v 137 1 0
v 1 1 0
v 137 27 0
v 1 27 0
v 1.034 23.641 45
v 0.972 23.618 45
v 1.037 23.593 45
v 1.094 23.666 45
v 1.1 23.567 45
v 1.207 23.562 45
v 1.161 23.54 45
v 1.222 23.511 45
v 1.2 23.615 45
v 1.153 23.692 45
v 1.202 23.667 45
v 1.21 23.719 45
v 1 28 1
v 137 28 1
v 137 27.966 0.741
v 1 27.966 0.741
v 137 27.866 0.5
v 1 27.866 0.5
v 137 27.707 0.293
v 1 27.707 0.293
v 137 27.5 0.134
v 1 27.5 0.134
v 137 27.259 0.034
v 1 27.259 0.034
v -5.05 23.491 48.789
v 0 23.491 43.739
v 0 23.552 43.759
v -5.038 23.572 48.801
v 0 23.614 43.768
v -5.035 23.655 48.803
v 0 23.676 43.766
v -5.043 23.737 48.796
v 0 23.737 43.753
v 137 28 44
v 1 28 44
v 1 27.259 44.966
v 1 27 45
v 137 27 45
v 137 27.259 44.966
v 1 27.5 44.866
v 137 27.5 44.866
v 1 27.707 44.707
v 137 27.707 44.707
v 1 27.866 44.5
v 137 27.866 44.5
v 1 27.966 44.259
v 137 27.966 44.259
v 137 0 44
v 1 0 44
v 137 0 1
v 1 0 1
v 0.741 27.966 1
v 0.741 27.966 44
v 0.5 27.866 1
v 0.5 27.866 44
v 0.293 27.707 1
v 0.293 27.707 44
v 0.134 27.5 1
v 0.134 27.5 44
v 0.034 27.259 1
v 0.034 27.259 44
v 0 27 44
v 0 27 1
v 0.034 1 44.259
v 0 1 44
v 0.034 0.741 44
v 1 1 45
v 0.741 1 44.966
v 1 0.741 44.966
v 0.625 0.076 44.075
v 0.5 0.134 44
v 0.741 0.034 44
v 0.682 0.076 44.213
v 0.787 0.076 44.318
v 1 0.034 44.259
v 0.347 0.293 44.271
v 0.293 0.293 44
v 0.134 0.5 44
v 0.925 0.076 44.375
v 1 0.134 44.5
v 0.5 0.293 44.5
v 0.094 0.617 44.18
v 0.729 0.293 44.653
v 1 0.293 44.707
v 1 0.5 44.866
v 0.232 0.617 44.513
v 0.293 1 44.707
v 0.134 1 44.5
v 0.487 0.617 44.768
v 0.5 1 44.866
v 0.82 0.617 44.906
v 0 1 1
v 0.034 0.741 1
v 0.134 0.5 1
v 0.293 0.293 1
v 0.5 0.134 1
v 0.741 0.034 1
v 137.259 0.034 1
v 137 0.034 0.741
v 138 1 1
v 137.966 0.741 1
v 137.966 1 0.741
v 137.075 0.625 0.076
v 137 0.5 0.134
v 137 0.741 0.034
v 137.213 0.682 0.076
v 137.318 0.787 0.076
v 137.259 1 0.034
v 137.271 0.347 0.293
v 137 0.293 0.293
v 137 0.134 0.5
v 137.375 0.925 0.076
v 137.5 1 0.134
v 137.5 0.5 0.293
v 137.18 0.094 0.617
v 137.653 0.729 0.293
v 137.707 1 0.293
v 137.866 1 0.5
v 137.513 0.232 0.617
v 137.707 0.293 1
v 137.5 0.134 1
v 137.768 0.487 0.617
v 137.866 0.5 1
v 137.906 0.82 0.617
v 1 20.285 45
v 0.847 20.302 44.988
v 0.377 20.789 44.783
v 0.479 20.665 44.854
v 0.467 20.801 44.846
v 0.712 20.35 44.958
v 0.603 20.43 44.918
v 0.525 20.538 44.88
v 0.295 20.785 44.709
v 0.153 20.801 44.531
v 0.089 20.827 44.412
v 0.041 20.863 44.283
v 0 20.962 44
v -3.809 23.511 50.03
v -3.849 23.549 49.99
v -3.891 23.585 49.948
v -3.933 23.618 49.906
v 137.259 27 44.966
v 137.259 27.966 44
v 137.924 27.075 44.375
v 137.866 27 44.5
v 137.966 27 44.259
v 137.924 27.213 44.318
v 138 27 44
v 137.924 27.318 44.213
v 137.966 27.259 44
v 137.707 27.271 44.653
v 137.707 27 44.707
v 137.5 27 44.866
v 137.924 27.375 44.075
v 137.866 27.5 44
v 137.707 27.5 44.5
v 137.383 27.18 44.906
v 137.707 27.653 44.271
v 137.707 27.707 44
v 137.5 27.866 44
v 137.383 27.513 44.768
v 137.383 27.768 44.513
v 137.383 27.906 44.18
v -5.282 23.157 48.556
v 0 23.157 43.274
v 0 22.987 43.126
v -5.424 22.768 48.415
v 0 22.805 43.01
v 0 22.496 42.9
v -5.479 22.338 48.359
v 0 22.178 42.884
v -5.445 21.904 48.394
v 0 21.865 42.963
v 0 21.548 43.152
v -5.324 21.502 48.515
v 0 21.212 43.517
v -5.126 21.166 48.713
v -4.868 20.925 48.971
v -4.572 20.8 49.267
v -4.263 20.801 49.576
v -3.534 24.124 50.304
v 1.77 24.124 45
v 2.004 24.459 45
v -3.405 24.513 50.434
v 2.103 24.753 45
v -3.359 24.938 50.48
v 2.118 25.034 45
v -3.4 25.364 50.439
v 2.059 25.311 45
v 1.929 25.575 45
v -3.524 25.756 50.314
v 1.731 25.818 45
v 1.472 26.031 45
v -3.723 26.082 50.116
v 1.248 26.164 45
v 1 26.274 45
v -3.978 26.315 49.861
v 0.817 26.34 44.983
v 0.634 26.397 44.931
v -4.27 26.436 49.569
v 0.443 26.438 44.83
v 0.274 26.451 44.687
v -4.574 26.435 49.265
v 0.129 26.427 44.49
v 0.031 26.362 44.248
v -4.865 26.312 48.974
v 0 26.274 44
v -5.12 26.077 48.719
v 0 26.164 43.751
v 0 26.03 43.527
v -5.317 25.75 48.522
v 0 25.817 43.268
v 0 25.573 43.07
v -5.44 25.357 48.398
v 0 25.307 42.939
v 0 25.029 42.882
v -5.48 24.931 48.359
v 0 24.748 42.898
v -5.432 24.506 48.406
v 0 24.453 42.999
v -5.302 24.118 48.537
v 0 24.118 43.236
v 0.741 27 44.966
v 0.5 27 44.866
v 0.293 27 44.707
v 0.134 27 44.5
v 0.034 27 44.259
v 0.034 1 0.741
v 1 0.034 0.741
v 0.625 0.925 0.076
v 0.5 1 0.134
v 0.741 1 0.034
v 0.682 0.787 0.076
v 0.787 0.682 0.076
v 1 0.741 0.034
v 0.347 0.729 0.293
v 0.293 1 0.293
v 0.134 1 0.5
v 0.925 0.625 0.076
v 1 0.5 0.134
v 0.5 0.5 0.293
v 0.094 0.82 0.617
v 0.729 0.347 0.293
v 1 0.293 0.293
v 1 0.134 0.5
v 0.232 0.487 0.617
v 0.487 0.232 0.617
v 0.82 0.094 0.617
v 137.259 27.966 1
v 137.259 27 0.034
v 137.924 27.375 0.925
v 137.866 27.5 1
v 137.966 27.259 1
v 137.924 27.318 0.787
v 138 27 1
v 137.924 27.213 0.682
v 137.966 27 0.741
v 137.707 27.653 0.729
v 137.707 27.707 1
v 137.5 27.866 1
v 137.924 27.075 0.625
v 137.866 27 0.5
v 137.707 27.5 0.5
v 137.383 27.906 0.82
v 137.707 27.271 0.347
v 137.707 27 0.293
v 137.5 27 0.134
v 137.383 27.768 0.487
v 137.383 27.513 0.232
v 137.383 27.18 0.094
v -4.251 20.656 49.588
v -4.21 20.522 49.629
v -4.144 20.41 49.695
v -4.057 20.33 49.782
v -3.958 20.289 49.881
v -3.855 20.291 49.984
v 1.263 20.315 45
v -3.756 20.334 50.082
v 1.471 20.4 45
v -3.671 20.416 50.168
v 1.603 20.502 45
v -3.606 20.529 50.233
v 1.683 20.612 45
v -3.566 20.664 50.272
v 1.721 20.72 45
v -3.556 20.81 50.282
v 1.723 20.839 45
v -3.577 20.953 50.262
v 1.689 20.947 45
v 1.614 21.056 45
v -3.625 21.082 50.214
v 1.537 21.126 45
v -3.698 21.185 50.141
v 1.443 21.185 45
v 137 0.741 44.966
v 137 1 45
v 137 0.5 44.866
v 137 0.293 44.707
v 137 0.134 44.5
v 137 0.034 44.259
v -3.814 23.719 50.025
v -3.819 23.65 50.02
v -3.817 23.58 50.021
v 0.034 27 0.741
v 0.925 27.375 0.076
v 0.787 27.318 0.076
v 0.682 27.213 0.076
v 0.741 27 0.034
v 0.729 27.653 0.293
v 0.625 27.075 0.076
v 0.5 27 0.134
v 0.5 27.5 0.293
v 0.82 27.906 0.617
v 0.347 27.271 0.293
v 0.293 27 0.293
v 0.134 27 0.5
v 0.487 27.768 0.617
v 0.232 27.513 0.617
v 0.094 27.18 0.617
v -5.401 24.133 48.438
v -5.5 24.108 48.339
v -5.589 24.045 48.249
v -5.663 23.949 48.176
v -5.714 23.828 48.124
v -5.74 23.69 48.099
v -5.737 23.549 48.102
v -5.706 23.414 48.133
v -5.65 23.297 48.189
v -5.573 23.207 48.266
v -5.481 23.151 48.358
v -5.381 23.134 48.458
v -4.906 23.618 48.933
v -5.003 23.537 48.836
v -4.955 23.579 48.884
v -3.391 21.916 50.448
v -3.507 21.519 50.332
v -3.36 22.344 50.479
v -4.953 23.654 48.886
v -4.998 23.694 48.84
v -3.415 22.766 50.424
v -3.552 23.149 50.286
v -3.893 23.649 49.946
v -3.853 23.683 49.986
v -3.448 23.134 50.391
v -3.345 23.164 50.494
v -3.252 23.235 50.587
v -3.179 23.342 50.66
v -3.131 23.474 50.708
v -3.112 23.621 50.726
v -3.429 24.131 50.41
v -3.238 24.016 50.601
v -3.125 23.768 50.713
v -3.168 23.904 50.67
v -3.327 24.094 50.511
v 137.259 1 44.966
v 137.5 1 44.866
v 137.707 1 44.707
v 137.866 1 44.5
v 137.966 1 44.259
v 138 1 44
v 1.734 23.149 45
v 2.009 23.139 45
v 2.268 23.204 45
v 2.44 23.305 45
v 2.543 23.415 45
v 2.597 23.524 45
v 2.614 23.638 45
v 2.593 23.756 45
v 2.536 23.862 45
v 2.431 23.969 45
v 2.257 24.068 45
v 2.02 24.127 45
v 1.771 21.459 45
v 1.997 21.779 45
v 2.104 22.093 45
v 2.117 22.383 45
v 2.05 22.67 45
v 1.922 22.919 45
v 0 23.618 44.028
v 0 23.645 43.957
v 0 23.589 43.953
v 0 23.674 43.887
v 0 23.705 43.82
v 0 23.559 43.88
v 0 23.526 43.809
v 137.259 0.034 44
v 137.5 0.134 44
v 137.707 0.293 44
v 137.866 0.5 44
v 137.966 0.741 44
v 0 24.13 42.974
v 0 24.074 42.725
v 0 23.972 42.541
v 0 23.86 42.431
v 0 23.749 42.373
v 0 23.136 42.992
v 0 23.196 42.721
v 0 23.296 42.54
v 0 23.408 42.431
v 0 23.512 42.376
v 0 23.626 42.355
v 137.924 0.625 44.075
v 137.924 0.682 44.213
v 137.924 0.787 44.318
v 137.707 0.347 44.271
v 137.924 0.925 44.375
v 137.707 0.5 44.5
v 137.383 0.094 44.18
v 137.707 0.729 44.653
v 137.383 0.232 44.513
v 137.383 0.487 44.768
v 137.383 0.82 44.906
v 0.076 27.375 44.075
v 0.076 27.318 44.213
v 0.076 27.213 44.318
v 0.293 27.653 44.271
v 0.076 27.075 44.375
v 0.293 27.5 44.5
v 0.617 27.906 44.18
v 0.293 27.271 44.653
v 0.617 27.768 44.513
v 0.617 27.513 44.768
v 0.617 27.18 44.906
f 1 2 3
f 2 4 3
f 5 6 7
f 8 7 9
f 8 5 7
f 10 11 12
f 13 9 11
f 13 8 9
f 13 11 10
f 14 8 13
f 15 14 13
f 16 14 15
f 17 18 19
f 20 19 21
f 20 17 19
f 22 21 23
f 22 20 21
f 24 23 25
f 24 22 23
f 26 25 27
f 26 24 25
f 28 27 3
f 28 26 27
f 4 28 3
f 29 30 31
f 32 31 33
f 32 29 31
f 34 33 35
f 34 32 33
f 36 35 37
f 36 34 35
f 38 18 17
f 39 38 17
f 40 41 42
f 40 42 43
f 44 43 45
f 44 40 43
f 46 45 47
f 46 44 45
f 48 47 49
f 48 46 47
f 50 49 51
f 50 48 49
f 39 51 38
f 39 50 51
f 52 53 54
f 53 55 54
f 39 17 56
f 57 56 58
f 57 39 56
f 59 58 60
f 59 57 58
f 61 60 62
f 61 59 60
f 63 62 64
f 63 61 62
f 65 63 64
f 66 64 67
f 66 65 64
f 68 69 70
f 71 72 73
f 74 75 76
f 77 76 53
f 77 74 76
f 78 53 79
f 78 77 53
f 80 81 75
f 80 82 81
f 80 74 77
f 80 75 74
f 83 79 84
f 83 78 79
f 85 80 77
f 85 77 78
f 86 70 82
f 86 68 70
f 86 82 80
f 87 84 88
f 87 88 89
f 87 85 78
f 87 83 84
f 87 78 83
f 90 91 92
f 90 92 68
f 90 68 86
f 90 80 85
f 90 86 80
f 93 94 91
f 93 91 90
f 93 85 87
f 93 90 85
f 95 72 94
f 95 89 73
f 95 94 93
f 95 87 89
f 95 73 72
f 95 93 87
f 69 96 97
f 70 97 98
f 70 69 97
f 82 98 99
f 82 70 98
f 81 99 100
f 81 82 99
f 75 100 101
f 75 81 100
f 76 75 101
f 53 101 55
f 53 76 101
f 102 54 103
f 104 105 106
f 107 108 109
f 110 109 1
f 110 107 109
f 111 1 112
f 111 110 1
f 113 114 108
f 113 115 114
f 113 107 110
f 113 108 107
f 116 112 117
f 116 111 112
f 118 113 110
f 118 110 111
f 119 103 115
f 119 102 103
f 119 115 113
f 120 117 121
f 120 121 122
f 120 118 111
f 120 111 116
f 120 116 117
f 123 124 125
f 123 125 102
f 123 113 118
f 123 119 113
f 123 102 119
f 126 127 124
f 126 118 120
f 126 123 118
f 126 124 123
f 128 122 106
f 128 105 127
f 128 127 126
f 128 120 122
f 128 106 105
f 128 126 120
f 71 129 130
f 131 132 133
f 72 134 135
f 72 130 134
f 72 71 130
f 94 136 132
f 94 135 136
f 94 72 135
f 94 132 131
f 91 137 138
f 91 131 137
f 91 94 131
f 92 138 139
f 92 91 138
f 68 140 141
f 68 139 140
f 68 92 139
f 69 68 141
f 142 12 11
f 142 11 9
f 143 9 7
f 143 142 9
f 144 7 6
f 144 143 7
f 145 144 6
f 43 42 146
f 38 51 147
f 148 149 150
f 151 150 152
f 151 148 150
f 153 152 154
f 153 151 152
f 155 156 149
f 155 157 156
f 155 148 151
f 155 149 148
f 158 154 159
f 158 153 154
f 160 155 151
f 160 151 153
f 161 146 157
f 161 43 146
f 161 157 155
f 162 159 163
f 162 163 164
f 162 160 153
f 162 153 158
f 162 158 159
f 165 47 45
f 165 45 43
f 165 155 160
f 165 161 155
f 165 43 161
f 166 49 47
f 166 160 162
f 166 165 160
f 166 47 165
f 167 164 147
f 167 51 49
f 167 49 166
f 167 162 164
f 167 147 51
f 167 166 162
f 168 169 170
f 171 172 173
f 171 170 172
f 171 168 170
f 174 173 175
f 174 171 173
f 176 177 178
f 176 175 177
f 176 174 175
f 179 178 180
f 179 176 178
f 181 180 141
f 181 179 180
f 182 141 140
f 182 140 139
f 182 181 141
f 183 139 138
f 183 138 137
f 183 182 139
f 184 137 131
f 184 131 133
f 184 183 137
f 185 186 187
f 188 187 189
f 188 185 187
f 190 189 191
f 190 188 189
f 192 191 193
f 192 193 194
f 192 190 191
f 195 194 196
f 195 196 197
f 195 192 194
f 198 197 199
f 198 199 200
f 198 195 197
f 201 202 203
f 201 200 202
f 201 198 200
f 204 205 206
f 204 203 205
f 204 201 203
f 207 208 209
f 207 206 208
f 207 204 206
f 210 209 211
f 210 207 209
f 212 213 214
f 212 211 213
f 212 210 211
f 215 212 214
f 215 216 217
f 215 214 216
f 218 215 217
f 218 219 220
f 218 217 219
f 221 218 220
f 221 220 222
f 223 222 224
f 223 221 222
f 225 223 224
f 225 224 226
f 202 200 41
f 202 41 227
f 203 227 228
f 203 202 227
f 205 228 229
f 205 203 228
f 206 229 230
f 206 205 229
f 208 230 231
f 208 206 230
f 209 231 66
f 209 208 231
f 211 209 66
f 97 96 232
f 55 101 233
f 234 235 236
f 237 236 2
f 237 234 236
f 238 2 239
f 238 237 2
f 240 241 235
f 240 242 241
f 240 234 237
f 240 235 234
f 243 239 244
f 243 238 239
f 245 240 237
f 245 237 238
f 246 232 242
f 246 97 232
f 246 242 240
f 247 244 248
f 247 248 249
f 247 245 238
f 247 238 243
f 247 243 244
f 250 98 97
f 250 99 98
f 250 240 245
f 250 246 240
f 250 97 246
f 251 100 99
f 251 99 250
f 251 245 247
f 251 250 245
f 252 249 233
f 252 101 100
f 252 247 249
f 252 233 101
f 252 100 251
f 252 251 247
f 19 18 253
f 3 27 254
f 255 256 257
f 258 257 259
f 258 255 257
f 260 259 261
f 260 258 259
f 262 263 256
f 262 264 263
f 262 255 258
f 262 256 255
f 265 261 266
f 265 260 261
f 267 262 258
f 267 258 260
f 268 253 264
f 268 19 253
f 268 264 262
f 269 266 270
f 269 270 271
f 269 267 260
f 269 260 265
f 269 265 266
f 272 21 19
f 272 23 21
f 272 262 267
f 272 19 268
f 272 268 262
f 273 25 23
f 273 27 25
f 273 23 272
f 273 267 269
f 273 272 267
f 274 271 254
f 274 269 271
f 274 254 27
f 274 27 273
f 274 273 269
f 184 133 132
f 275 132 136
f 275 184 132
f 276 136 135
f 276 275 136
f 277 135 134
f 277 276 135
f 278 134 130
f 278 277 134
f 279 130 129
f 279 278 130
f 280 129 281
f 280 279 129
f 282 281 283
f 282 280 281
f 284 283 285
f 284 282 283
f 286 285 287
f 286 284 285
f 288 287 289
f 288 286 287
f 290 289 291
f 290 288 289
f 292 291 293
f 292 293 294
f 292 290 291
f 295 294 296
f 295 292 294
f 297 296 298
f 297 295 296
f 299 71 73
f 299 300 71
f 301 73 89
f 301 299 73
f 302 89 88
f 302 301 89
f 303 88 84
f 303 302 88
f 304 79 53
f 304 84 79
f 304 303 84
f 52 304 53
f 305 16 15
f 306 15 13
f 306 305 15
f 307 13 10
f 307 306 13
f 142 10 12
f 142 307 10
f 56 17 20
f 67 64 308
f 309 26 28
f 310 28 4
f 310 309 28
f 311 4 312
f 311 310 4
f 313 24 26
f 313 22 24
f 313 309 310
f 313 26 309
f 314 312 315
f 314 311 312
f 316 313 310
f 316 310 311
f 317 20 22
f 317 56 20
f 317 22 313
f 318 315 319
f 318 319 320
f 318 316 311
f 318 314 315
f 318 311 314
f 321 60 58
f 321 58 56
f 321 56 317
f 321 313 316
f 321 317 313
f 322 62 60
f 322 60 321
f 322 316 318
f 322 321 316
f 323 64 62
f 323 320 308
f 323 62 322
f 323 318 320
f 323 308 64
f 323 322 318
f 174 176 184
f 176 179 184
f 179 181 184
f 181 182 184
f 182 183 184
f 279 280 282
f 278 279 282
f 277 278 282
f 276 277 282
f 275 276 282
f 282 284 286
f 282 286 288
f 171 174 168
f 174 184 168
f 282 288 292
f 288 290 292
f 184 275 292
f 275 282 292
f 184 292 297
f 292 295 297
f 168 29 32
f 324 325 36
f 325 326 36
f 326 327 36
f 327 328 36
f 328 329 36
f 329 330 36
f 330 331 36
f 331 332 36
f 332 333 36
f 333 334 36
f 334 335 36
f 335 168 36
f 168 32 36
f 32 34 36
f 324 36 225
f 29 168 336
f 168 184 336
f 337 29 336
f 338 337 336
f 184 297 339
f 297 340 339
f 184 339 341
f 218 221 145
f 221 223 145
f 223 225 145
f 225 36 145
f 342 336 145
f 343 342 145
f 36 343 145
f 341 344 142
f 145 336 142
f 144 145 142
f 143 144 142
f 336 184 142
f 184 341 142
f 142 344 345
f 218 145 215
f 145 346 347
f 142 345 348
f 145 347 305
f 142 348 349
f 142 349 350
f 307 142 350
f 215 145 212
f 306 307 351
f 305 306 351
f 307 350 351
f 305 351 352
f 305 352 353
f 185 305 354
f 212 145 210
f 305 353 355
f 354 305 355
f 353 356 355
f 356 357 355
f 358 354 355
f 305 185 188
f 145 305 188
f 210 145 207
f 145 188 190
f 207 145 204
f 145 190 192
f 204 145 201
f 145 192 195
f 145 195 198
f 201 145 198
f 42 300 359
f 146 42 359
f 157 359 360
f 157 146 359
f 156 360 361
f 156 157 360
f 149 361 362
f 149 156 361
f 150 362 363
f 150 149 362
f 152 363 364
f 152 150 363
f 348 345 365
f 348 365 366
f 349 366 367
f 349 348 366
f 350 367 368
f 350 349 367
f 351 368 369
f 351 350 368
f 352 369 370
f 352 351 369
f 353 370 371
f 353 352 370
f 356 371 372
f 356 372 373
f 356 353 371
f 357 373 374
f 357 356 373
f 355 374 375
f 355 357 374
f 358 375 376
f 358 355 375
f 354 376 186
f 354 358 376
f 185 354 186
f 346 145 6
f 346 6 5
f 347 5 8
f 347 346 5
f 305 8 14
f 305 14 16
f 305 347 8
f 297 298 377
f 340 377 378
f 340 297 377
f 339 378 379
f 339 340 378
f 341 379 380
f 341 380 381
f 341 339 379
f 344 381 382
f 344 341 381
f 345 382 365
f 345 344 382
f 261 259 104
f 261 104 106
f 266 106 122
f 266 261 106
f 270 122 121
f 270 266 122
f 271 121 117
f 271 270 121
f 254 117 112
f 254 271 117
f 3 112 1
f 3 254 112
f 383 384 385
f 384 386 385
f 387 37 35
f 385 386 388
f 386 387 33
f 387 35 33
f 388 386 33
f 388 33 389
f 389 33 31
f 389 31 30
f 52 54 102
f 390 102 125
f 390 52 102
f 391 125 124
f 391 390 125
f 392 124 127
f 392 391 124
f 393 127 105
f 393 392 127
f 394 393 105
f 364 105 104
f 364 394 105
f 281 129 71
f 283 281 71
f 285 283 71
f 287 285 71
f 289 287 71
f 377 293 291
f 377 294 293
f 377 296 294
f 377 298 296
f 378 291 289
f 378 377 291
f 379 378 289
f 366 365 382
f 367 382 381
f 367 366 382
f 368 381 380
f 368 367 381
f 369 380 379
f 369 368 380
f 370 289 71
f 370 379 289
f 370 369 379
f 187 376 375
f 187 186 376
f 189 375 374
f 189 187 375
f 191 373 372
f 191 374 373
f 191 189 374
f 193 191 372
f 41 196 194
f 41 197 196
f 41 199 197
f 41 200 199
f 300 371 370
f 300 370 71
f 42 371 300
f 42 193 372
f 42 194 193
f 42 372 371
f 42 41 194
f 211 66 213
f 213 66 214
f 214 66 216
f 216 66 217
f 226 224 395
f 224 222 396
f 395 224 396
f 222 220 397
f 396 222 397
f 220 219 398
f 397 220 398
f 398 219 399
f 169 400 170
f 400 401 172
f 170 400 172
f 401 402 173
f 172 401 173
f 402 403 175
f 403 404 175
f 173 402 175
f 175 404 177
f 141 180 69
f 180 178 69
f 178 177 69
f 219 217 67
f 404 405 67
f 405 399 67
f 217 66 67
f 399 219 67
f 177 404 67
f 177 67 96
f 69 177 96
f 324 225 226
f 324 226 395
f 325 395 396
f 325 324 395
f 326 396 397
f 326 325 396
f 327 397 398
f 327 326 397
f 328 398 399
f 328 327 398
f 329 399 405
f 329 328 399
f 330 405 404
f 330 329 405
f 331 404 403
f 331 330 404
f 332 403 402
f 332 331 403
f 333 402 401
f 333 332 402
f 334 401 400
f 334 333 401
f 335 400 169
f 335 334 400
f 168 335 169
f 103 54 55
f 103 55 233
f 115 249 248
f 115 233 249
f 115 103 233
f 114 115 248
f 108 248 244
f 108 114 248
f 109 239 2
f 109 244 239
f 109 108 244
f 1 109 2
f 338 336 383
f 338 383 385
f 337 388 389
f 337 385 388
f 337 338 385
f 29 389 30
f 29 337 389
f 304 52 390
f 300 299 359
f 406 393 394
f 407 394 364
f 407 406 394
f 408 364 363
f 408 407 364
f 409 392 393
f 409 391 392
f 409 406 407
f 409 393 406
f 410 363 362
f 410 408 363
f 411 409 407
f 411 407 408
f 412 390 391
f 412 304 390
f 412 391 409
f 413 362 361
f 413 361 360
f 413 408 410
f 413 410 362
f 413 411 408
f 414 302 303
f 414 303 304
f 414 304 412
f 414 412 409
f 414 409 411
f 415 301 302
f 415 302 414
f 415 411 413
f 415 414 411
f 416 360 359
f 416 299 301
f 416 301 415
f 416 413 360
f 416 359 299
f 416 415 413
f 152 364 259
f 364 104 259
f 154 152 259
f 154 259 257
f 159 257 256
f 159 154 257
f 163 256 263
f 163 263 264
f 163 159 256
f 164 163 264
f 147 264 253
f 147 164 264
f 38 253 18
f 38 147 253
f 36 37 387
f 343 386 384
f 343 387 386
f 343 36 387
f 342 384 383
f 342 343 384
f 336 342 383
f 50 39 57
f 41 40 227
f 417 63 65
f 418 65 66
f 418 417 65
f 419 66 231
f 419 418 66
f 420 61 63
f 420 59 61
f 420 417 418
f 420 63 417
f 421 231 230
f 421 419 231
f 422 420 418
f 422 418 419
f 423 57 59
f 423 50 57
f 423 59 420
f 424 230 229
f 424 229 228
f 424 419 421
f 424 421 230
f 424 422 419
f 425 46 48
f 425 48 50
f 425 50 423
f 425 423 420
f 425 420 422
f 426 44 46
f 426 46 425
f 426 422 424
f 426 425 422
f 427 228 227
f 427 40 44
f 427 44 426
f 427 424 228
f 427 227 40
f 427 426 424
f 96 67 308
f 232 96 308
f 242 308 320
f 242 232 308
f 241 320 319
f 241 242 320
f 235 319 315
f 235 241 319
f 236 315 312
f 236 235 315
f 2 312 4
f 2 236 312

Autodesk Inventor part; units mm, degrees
ref_plane "YZ Plane" through (0, 0, 0) normal (1, 0, 0) x (0, 1, 0)
ref_plane "XZ Plane" through (0, 0, 0) normal (0, 1, 0) x (-1, 0, 0)
sketch "Sketch1" plane through (0, 0, 0) normal (0, 0, 1) x (1, 0, 0)
  line L0 (0, 0) -> (138, 0)
  line L1 (138, 0) -> (138, 28)
  line L2 (138, 28) -> (0, 28)
  line L3 (0, 28) -> (0, 0)
  dimension "d0" = 138
  dimension "d1" = 28
extrude "Extrusion1" add sketch "Sketch1" along normal blind 45
ref_plane "Work Plane1" through (0, 28, 45) normal (0.7071, 0, -0.7071) x (0, 1, 0)
sketch "Sketch2" plane through (0, 28, 45) normal (0.7071, 0, -0.7071) x (0, 1, 0)
  line L0 (-28, 0) -> (0, 0) projected
  circle A0 centre (-3.049, 0) radius 1.5
  circle A1 centre (-5.7153, 0) radius 1.5
  circle A2 centre (-7.2153, 0.7211) radius 0.5
  circle A3 centre (-4.3663, 1.3485) radius 0.5
  circle A4 centre (-4.3663, -1.3706) radius 0.5
  point P0 (-28, -31.8198)
  dimension "d5" = 3
  dimension "d6" = 3
  dimension "d7" = 1
  dimension "d8" = 1
  dimension "d9" = 1
extrude "Extrusion2" add sketch "Sketch2" along normal mid plane 12.5 contours A1 A0 A3 L0 | A1 A0 L0 | L0 A0 A1 | L0 A0 A4 A1 | A0 A1 A4 L0 | L0 A1 A2 A3 A0 | A3 A0 | A0 A3 A1 | A4 A1 A0 | A0 A4 | A3 A1 | A1 A4 | A2 A1 | A1 A2 picked at (-4.3907, 1.3671) picked at (-4.3952, -1.3761)
fillet "Fillet1" radius 1 13 edges at (0, 10.3924, 45) (69, 28, 45) (69, 0, 45) (0, 27.2255, 45) (0, 28, 22.5) (0, 0, 22.5) (0, 14, 0) (69, 28, 0) (138, 28, 22.5) (138, 14, 45) (138, 0, 22.5) (138, 14, 0) (69, 0, 0)
properties part number "LiPoBattery"
